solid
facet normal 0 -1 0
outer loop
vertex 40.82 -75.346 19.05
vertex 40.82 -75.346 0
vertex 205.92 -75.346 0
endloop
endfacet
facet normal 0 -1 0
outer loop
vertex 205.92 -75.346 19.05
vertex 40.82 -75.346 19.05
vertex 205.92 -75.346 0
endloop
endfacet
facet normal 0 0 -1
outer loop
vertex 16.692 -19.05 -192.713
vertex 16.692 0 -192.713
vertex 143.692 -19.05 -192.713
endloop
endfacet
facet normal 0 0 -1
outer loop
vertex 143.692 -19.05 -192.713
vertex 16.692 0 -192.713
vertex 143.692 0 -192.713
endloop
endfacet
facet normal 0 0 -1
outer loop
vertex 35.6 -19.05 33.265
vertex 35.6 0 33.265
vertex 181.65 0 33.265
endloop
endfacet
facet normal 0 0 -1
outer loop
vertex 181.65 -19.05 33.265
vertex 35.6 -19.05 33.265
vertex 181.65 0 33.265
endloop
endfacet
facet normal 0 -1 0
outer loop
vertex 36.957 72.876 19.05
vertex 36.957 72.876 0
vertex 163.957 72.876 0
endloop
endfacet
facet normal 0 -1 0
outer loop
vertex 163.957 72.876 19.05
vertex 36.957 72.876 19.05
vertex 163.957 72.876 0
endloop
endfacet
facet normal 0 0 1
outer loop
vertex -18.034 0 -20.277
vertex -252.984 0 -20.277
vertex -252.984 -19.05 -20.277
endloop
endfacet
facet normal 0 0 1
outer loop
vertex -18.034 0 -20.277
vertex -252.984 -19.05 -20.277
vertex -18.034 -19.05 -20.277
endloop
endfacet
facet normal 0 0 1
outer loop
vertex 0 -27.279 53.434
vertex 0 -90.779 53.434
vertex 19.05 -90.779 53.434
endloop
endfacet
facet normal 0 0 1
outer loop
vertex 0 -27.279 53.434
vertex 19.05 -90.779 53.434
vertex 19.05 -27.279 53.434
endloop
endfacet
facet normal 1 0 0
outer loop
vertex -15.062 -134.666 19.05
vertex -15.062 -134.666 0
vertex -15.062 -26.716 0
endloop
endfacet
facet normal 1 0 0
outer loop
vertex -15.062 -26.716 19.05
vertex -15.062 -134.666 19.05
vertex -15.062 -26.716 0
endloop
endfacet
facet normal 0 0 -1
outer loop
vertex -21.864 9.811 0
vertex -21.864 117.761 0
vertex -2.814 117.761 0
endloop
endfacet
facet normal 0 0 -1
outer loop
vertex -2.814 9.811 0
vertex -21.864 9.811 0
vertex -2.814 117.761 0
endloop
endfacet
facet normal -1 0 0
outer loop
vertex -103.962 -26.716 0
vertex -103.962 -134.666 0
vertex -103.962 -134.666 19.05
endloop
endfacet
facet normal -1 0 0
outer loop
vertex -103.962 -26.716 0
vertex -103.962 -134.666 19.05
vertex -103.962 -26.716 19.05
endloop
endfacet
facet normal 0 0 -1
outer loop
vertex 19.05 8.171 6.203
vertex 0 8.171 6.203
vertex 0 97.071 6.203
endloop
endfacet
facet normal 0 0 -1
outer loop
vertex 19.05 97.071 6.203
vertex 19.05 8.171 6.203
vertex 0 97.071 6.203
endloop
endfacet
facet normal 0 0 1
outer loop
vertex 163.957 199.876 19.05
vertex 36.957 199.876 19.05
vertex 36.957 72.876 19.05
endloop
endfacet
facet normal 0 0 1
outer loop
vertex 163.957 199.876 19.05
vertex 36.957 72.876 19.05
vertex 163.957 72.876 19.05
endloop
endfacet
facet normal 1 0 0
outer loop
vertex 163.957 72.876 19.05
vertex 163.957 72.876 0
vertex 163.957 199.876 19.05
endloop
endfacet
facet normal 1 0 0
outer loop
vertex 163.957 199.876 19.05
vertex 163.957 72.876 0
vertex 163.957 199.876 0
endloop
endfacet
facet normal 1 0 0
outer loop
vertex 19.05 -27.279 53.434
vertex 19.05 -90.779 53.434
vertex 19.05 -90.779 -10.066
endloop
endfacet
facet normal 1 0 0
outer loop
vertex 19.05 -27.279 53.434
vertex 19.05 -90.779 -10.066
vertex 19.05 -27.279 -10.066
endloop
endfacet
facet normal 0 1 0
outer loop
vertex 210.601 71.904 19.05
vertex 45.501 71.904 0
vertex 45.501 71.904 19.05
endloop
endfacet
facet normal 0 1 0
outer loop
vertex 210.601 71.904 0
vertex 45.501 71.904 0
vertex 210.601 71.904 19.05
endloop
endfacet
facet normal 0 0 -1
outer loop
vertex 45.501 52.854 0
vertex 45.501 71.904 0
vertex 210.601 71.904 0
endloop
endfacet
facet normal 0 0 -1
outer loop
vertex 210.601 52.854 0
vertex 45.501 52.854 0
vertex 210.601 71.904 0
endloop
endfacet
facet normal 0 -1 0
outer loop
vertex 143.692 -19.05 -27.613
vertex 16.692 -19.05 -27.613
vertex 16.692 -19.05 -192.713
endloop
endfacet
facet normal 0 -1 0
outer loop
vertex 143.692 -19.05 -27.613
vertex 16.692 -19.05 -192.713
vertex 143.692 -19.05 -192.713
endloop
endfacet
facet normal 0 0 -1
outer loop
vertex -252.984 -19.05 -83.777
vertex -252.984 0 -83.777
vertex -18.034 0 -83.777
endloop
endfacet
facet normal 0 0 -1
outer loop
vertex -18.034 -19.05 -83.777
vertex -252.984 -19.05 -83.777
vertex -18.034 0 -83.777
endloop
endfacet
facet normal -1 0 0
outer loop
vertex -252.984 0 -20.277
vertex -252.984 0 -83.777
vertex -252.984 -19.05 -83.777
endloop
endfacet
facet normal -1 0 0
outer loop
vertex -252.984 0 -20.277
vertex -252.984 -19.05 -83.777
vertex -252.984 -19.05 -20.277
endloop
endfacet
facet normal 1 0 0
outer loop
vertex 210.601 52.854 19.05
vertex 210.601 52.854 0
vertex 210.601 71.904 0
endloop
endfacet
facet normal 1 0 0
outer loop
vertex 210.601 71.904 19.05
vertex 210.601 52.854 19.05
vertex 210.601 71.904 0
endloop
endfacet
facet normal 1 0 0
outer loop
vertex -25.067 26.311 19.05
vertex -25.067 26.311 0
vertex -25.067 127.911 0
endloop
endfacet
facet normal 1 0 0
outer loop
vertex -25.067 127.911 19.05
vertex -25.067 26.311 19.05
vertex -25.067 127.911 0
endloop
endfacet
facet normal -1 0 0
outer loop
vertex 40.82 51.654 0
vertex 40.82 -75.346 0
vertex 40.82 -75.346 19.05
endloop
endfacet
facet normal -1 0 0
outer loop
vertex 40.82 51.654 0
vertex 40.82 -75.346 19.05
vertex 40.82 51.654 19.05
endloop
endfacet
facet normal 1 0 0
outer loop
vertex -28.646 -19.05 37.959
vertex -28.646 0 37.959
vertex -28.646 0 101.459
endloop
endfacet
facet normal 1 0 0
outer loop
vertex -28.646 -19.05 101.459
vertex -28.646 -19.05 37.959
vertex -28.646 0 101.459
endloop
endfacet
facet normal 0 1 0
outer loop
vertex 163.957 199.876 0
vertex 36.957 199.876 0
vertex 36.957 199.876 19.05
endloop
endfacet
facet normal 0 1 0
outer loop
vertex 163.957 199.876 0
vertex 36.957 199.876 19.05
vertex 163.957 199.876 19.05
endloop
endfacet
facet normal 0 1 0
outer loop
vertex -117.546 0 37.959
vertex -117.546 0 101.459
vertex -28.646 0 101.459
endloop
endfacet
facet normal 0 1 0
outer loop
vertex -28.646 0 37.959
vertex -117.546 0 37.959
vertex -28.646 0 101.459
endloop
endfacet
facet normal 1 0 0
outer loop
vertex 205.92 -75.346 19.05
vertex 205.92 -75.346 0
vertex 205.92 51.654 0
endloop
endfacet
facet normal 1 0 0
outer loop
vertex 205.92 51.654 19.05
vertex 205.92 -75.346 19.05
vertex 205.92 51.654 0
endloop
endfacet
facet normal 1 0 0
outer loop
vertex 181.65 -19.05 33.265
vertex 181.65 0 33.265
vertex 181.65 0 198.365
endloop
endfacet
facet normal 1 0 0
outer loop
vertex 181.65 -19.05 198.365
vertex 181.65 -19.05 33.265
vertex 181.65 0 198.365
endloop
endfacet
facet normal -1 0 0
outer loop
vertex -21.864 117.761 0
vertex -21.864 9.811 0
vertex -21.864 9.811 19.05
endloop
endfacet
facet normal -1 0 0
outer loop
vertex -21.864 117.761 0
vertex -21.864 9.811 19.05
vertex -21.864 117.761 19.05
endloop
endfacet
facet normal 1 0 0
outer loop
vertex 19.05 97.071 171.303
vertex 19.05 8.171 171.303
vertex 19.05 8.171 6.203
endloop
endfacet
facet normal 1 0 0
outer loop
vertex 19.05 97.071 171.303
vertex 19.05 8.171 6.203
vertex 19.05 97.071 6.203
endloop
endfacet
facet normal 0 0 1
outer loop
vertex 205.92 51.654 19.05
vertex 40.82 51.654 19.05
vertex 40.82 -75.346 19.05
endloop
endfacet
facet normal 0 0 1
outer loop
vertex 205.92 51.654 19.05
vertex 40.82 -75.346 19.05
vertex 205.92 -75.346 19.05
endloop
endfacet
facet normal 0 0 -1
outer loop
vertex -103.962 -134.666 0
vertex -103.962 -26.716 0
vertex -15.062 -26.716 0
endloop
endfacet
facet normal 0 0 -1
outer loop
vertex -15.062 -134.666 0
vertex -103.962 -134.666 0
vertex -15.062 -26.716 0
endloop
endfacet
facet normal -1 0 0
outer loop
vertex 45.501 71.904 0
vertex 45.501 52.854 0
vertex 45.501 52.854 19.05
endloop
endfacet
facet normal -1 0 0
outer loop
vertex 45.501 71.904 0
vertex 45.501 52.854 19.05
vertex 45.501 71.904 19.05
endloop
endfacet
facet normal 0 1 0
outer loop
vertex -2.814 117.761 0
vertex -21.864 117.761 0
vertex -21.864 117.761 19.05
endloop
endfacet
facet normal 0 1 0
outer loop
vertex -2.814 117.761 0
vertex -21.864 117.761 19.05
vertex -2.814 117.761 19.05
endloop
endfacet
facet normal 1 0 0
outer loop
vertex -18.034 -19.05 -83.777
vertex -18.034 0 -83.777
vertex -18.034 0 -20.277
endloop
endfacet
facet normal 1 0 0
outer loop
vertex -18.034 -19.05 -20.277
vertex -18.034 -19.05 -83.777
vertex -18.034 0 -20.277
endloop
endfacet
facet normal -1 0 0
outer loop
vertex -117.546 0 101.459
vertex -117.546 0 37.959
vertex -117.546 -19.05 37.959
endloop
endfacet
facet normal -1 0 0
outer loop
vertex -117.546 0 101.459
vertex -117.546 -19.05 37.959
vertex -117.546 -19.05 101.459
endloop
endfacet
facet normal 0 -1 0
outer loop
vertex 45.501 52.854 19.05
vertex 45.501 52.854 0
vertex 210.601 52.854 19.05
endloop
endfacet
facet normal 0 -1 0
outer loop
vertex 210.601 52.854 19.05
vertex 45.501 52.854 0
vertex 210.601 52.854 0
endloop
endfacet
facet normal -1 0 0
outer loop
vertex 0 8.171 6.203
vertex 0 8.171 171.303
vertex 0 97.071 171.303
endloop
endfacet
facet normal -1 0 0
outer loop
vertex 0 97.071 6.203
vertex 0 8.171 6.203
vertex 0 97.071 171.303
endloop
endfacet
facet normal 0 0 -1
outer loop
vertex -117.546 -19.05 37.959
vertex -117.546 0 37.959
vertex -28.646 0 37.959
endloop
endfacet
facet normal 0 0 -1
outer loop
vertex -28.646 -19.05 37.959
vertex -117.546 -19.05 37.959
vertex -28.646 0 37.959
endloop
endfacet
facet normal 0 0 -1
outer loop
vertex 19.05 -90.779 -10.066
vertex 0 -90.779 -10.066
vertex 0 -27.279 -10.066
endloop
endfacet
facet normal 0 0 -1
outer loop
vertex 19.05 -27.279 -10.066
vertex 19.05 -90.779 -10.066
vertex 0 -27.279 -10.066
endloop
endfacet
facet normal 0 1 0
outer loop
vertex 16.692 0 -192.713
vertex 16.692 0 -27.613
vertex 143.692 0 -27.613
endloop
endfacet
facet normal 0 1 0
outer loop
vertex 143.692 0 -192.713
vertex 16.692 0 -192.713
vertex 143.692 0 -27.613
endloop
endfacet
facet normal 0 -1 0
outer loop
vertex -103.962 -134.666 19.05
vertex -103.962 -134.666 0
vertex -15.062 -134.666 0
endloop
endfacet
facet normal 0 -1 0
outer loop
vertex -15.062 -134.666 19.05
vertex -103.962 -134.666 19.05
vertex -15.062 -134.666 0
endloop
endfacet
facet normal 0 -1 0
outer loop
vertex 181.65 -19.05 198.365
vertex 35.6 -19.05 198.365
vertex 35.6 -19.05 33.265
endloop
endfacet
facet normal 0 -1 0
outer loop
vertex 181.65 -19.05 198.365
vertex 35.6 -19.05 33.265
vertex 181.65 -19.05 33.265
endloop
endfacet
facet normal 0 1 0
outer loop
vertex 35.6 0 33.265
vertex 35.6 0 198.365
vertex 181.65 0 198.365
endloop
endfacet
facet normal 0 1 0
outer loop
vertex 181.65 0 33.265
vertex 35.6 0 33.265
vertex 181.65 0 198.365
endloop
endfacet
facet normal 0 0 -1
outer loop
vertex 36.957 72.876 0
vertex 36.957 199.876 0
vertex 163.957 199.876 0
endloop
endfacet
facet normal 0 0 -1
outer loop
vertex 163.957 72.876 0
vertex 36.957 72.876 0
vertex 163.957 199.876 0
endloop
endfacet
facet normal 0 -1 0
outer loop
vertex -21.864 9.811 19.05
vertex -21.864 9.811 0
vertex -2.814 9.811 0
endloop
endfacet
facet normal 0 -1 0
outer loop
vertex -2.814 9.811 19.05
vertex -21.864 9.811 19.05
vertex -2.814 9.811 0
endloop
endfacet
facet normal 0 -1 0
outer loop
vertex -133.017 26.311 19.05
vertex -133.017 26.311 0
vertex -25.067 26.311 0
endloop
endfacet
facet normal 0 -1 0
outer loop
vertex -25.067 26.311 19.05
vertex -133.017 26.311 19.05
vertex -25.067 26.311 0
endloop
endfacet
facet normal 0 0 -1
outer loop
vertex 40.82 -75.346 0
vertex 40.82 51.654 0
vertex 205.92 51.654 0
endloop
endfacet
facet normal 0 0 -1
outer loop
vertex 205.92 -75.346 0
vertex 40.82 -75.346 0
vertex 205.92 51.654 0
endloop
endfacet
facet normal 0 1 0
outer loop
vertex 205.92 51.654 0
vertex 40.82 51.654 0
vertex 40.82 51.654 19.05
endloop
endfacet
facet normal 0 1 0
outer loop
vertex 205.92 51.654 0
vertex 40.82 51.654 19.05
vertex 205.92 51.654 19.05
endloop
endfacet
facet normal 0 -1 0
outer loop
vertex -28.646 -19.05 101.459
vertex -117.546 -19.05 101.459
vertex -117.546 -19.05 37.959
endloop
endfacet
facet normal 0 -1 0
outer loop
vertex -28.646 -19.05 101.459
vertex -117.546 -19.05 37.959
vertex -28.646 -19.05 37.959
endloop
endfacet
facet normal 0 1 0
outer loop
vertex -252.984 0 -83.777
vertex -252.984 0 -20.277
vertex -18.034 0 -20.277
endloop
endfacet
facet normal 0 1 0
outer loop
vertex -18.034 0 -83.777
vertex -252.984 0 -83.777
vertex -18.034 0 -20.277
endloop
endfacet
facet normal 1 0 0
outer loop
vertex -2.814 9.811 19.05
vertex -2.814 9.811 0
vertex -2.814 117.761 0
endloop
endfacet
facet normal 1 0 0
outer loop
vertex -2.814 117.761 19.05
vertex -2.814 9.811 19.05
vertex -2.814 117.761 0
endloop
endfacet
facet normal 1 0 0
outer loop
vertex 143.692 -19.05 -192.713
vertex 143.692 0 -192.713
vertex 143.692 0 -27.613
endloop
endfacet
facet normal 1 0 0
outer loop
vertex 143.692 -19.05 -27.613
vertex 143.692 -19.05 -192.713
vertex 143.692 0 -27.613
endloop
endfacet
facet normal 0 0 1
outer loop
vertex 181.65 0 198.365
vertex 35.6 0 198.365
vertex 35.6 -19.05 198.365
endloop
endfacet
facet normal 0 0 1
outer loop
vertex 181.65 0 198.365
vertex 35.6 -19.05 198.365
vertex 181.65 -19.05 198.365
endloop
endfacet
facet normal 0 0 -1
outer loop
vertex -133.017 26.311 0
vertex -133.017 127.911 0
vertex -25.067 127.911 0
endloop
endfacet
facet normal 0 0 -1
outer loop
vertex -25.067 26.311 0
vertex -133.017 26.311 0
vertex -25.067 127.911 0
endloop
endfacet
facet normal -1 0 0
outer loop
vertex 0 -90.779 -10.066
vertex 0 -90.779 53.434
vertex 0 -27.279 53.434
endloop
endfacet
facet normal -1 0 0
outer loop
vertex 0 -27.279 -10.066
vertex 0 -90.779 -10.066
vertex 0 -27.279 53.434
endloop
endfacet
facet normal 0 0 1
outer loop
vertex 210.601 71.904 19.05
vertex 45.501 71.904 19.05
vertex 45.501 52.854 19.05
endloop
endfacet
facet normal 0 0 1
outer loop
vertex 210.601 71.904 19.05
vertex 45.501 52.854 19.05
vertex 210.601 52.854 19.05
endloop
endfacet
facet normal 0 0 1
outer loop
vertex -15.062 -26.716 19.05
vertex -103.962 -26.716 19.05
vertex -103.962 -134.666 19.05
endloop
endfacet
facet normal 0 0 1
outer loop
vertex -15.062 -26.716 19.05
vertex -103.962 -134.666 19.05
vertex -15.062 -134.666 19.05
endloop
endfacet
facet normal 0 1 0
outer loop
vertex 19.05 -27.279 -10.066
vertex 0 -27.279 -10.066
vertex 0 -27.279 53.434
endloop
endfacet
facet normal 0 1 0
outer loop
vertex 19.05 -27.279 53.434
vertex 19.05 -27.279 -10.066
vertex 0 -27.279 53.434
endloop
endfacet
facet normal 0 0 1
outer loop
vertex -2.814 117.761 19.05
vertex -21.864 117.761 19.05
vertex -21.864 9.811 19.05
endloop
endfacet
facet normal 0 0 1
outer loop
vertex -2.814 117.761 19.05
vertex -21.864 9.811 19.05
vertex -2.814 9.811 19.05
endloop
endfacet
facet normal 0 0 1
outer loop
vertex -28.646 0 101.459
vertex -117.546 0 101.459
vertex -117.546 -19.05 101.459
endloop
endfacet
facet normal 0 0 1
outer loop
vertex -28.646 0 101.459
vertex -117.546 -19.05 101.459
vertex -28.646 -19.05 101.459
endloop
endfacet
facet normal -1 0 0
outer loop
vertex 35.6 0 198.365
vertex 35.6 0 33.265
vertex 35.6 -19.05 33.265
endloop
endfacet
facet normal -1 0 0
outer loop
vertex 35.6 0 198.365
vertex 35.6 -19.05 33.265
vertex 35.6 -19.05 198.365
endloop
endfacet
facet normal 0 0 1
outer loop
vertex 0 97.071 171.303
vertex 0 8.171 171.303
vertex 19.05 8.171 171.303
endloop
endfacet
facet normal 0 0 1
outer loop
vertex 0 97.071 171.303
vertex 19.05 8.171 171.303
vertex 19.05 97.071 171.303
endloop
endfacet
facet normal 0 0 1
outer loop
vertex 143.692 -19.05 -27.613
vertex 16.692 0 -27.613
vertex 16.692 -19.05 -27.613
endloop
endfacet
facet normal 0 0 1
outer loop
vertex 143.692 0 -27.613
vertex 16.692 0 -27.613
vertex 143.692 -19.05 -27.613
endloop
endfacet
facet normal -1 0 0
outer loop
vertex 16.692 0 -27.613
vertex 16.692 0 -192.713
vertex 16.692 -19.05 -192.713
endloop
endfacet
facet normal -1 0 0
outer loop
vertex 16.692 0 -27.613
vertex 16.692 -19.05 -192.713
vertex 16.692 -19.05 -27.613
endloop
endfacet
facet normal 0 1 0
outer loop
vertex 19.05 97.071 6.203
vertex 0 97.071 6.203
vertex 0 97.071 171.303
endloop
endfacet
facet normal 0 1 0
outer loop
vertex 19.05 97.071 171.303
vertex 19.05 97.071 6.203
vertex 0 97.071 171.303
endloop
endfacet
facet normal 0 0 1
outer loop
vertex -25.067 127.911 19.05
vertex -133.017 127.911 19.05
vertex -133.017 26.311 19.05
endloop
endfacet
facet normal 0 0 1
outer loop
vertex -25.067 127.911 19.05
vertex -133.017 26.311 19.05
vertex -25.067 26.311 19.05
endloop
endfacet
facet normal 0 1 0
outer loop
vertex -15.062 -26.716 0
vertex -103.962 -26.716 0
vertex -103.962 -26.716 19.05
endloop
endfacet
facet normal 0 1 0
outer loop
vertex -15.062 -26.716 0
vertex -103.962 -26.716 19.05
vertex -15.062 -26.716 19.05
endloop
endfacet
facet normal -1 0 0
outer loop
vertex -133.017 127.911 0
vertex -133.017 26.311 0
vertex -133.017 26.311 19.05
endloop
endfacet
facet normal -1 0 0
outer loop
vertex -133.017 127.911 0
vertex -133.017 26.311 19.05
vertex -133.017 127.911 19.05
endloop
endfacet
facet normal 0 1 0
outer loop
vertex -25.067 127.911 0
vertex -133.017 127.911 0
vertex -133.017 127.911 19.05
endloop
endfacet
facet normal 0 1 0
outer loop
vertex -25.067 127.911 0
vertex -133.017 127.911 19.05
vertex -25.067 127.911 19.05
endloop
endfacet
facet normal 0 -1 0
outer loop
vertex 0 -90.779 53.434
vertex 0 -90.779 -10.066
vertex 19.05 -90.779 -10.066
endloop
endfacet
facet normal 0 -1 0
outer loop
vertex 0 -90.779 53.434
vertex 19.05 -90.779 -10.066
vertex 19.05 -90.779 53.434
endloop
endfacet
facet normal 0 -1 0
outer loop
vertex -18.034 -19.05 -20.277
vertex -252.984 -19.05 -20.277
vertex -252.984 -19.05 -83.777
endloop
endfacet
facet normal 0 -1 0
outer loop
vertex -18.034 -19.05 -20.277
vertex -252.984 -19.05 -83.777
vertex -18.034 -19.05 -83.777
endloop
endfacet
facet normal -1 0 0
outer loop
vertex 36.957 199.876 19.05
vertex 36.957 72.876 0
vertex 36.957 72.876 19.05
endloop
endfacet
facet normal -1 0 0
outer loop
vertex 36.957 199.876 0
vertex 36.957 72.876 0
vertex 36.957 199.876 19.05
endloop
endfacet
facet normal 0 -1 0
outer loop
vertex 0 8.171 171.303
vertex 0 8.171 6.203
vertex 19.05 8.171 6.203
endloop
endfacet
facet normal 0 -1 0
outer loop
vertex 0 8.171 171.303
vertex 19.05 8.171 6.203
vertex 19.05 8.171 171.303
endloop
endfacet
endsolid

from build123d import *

# Parameters (mm, degrees)
F0_W      = 88.9
F0_H      = 165.1
F1_DEPTH  = 19.05
F2_W      = 63.5
F2_H      = 63.5
F3_DEPTH  = 19.05
F4_W      = 127
F4_H      = 127
F5_DEPTH  = 19.05
F6_W      = 107.95
F6_H      = 101.6
F7_DEPTH  = 19.05
F8_W      = 88.9
F8_H      = 63.5
F9_DEPTH  = 19.05
F10_W     = 127
F10_H     = 165.1
F11_DEPTH = 19.05
F12_W     = 165.1
F12_H     = 127
F13_DEPTH = 19.05
F14_W     = 146.05
F14_H     = 165.1
F15_DEPTH = 19.05
F16_W     = 234.95
F16_H     = 63.5
F17_DEPTH = 19.05
F18_W     = 88.9
F18_H     = 107.95
F19_DEPTH = 19.05
F20_W     = 165.1
F20_H     = 19.05
F21_DEPTH = 19.05
F22_W     = 19.05
F22_H     = 107.95
F23_DEPTH = 19.05


with BuildPart() as f1:
    # F0 (on Right) → F1 (new body)
    with BuildSketch(Plane.YZ):
        with Locations((52.620952, 88.752854)):
            Rectangle(F0_W, F0_H)
    extrude(amount=F1_DEPTH)


with BuildPart() as f3:
    # F2 (on Right) → F3 (new body)
    with BuildSketch(Plane.YZ):
        with Locations((-59.02932, 21.684153)):
            Rectangle(F2_W, F2_H)
    extrude(amount=F3_DEPTH)


with BuildPart() as f5:
    # F4 (on Top) → F5 (new body)
    with BuildSketch(Plane.XY):
        with Locations((100.457397, 136.375904)):
            Rectangle(F4_W, F4_H)
    extrude(amount=F5_DEPTH)


with BuildPart() as f7:
    # F6 (on Top) → F7 (new body)
    with BuildSketch(Plane.XY):
        with Locations((-79.042168, 77.111321)):
            Rectangle(F6_W, F6_H)
    extrude(amount=F7_DEPTH)


with BuildPart() as f9:
    # F8 (on Front) → F9 (new body)
    with BuildSketch(Plane.XZ):
        with Locations((-73.096486, 69.708673)):
            Rectangle(F8_W, F8_H)
    extrude(amount=F9_DEPTH)


with BuildPart() as f11:
    # F10 (on Front) → F11 (new body)
    with BuildSketch(Plane.XZ):
        with Locations((80.191935, -110.162609)):
            Rectangle(F10_W, F10_H)
    extrude(amount=F11_DEPTH)


with BuildPart() as f13:
    # F12 (on Top) → F13 (new body)
    with BuildSketch(Plane.XY):
        with Locations((123.370355, -11.846392)):
            Rectangle(F12_W, F12_H)
    extrude(amount=F13_DEPTH)


with BuildPart() as f15:
    # F14 (on Front) → F15 (new body)
    with BuildSketch(Plane.XZ):
        with Locations((108.625146, 115.814913)):
            Rectangle(F14_W, F14_H)
    extrude(amount=F15_DEPTH)


with BuildPart() as f17:
    # F16 (on Front) → F17 (new body)
    with BuildSketch(Plane.XZ):
        with Locations((-135.509282, -52.027315)):
            Rectangle(F16_W, F16_H)
    extrude(amount=F17_DEPTH)


with BuildPart() as f19:
    # F18 (on Top) → F19 (new body)
    with BuildSketch(Plane.XY):
        with Locations((-59.511982, -80.691455)):
            Rectangle(F18_W, F18_H)
    extrude(amount=F19_DEPTH)


with BuildPart() as f21:
    # F20 (on Top) → F21 (new body)
    with BuildSketch(Plane.XY):
        with Locations((128.050601, 62.378677)):
            Rectangle(F20_W, F20_H)
    extrude(amount=F21_DEPTH)


with BuildPart() as f23:
    # F22 (on Top) → F23 (new body)
    with BuildSketch(Plane.XY):
        with Locations((-12.33854, 63.785868)):
            Rectangle(F22_W, F22_H)
    extrude(amount=F23_DEPTH)


solid = Compound([f1.part, f3.part, f5.part, f7.part, f9.part, f11.part, f13.part, f15.part, f17.part, f19.part, f21.part, f23.part])
